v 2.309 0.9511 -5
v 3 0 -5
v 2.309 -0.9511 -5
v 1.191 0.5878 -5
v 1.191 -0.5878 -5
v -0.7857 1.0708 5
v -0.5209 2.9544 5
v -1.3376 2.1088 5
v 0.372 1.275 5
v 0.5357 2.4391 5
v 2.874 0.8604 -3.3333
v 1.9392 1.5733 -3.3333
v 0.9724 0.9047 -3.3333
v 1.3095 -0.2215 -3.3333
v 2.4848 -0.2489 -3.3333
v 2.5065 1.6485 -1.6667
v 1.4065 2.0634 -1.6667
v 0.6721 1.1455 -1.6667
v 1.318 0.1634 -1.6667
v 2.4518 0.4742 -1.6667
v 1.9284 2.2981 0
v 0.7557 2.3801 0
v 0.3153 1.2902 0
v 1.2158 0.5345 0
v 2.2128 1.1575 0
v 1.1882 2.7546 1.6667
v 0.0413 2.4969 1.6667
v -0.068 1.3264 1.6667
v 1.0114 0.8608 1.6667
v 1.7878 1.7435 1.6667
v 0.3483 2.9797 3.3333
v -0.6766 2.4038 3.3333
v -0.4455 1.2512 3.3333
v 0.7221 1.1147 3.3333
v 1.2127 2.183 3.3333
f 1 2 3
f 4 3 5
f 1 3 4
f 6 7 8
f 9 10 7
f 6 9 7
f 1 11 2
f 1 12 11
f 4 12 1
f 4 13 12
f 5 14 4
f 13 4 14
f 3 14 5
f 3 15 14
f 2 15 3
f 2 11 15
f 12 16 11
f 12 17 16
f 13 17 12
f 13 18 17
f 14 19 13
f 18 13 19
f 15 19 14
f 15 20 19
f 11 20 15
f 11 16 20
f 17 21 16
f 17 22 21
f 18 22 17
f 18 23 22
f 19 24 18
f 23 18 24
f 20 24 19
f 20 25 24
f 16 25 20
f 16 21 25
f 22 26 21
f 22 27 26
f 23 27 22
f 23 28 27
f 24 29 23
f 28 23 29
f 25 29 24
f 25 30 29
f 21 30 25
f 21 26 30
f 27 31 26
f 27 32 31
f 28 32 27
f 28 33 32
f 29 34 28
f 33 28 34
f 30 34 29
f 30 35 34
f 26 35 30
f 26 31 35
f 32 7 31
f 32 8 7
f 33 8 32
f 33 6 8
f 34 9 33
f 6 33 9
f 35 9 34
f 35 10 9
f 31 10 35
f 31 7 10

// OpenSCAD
linear_extrude(height = 10, center = true, convexity = 10, twist = -100)
translate([2, 0, 0])
circle(r = 1);
